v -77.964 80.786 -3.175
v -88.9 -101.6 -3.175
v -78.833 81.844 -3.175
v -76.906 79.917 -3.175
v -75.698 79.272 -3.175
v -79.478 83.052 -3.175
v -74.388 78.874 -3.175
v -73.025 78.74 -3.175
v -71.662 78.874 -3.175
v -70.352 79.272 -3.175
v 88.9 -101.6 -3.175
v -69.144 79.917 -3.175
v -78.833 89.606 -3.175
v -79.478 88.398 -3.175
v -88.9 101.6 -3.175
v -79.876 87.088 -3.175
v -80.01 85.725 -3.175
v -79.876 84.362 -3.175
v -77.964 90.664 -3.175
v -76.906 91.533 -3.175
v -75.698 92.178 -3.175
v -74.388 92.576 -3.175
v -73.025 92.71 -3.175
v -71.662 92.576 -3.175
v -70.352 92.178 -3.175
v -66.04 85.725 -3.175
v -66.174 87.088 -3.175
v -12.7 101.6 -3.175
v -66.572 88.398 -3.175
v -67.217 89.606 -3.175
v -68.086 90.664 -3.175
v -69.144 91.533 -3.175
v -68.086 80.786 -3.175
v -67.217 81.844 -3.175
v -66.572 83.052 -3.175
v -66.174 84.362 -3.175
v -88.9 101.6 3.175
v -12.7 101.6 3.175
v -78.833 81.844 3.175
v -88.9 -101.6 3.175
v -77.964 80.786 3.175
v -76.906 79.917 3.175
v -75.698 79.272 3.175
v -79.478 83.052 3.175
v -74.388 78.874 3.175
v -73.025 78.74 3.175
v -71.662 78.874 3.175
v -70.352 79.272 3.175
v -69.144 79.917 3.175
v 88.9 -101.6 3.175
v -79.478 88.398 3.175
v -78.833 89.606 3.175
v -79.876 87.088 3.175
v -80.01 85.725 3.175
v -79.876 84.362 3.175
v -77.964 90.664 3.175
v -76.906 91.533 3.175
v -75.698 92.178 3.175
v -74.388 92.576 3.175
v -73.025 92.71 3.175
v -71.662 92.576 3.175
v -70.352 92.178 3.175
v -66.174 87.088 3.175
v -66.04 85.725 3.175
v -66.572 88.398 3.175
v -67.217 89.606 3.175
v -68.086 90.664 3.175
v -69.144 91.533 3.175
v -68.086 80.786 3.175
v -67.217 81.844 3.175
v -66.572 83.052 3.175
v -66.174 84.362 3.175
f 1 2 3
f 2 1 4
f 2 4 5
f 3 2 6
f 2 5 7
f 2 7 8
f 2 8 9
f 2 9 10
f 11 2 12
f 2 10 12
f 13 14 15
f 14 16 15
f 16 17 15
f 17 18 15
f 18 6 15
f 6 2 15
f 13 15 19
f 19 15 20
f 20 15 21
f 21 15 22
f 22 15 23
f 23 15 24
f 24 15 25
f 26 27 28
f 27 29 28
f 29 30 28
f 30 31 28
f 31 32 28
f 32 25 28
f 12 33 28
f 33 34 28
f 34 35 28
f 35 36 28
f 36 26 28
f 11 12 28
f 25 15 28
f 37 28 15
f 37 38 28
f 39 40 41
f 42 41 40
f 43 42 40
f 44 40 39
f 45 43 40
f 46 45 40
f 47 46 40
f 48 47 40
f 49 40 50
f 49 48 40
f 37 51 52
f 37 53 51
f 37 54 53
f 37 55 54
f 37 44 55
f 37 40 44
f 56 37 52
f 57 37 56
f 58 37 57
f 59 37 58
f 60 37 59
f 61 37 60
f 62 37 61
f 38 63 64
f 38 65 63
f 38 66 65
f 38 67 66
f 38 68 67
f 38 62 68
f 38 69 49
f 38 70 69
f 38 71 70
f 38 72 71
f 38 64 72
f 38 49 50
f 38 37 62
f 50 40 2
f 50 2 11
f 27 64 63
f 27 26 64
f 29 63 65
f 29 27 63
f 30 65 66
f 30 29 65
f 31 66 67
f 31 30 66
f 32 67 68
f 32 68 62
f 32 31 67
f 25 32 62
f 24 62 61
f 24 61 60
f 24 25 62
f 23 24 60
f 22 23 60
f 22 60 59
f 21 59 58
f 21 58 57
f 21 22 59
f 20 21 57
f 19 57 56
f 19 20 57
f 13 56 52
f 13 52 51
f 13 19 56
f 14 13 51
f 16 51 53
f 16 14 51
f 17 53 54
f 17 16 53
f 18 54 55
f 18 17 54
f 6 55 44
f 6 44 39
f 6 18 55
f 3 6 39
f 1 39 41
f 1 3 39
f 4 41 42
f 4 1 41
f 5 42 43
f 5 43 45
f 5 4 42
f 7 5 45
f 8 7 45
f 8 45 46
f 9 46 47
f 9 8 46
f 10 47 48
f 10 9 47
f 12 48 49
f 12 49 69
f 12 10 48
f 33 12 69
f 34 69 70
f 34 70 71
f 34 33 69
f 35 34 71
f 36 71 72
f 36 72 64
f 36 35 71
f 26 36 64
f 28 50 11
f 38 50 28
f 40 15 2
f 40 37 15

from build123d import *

# Parameters (mm, degrees)
SKETCH1_R           = 6.985
BOSS_EXTRUDE1_DEPTH = 3.175


with BuildPart() as part:
    # Sketch1 → Boss-Extrude1 (new body, symmetric)
    with BuildSketch(Plane.XY):
        Polygon((-88.9, 101.6), (-88.9, -101.6), (88.9, -101.6), (-12.7, 101.6), align=None)
        with Locations((-73.025, 85.725)):
            Circle(SKETCH1_R, mode=Mode.SUBTRACT)
    extrude(amount=BOSS_EXTRUDE1_DEPTH, both=True)


solid = part.part
